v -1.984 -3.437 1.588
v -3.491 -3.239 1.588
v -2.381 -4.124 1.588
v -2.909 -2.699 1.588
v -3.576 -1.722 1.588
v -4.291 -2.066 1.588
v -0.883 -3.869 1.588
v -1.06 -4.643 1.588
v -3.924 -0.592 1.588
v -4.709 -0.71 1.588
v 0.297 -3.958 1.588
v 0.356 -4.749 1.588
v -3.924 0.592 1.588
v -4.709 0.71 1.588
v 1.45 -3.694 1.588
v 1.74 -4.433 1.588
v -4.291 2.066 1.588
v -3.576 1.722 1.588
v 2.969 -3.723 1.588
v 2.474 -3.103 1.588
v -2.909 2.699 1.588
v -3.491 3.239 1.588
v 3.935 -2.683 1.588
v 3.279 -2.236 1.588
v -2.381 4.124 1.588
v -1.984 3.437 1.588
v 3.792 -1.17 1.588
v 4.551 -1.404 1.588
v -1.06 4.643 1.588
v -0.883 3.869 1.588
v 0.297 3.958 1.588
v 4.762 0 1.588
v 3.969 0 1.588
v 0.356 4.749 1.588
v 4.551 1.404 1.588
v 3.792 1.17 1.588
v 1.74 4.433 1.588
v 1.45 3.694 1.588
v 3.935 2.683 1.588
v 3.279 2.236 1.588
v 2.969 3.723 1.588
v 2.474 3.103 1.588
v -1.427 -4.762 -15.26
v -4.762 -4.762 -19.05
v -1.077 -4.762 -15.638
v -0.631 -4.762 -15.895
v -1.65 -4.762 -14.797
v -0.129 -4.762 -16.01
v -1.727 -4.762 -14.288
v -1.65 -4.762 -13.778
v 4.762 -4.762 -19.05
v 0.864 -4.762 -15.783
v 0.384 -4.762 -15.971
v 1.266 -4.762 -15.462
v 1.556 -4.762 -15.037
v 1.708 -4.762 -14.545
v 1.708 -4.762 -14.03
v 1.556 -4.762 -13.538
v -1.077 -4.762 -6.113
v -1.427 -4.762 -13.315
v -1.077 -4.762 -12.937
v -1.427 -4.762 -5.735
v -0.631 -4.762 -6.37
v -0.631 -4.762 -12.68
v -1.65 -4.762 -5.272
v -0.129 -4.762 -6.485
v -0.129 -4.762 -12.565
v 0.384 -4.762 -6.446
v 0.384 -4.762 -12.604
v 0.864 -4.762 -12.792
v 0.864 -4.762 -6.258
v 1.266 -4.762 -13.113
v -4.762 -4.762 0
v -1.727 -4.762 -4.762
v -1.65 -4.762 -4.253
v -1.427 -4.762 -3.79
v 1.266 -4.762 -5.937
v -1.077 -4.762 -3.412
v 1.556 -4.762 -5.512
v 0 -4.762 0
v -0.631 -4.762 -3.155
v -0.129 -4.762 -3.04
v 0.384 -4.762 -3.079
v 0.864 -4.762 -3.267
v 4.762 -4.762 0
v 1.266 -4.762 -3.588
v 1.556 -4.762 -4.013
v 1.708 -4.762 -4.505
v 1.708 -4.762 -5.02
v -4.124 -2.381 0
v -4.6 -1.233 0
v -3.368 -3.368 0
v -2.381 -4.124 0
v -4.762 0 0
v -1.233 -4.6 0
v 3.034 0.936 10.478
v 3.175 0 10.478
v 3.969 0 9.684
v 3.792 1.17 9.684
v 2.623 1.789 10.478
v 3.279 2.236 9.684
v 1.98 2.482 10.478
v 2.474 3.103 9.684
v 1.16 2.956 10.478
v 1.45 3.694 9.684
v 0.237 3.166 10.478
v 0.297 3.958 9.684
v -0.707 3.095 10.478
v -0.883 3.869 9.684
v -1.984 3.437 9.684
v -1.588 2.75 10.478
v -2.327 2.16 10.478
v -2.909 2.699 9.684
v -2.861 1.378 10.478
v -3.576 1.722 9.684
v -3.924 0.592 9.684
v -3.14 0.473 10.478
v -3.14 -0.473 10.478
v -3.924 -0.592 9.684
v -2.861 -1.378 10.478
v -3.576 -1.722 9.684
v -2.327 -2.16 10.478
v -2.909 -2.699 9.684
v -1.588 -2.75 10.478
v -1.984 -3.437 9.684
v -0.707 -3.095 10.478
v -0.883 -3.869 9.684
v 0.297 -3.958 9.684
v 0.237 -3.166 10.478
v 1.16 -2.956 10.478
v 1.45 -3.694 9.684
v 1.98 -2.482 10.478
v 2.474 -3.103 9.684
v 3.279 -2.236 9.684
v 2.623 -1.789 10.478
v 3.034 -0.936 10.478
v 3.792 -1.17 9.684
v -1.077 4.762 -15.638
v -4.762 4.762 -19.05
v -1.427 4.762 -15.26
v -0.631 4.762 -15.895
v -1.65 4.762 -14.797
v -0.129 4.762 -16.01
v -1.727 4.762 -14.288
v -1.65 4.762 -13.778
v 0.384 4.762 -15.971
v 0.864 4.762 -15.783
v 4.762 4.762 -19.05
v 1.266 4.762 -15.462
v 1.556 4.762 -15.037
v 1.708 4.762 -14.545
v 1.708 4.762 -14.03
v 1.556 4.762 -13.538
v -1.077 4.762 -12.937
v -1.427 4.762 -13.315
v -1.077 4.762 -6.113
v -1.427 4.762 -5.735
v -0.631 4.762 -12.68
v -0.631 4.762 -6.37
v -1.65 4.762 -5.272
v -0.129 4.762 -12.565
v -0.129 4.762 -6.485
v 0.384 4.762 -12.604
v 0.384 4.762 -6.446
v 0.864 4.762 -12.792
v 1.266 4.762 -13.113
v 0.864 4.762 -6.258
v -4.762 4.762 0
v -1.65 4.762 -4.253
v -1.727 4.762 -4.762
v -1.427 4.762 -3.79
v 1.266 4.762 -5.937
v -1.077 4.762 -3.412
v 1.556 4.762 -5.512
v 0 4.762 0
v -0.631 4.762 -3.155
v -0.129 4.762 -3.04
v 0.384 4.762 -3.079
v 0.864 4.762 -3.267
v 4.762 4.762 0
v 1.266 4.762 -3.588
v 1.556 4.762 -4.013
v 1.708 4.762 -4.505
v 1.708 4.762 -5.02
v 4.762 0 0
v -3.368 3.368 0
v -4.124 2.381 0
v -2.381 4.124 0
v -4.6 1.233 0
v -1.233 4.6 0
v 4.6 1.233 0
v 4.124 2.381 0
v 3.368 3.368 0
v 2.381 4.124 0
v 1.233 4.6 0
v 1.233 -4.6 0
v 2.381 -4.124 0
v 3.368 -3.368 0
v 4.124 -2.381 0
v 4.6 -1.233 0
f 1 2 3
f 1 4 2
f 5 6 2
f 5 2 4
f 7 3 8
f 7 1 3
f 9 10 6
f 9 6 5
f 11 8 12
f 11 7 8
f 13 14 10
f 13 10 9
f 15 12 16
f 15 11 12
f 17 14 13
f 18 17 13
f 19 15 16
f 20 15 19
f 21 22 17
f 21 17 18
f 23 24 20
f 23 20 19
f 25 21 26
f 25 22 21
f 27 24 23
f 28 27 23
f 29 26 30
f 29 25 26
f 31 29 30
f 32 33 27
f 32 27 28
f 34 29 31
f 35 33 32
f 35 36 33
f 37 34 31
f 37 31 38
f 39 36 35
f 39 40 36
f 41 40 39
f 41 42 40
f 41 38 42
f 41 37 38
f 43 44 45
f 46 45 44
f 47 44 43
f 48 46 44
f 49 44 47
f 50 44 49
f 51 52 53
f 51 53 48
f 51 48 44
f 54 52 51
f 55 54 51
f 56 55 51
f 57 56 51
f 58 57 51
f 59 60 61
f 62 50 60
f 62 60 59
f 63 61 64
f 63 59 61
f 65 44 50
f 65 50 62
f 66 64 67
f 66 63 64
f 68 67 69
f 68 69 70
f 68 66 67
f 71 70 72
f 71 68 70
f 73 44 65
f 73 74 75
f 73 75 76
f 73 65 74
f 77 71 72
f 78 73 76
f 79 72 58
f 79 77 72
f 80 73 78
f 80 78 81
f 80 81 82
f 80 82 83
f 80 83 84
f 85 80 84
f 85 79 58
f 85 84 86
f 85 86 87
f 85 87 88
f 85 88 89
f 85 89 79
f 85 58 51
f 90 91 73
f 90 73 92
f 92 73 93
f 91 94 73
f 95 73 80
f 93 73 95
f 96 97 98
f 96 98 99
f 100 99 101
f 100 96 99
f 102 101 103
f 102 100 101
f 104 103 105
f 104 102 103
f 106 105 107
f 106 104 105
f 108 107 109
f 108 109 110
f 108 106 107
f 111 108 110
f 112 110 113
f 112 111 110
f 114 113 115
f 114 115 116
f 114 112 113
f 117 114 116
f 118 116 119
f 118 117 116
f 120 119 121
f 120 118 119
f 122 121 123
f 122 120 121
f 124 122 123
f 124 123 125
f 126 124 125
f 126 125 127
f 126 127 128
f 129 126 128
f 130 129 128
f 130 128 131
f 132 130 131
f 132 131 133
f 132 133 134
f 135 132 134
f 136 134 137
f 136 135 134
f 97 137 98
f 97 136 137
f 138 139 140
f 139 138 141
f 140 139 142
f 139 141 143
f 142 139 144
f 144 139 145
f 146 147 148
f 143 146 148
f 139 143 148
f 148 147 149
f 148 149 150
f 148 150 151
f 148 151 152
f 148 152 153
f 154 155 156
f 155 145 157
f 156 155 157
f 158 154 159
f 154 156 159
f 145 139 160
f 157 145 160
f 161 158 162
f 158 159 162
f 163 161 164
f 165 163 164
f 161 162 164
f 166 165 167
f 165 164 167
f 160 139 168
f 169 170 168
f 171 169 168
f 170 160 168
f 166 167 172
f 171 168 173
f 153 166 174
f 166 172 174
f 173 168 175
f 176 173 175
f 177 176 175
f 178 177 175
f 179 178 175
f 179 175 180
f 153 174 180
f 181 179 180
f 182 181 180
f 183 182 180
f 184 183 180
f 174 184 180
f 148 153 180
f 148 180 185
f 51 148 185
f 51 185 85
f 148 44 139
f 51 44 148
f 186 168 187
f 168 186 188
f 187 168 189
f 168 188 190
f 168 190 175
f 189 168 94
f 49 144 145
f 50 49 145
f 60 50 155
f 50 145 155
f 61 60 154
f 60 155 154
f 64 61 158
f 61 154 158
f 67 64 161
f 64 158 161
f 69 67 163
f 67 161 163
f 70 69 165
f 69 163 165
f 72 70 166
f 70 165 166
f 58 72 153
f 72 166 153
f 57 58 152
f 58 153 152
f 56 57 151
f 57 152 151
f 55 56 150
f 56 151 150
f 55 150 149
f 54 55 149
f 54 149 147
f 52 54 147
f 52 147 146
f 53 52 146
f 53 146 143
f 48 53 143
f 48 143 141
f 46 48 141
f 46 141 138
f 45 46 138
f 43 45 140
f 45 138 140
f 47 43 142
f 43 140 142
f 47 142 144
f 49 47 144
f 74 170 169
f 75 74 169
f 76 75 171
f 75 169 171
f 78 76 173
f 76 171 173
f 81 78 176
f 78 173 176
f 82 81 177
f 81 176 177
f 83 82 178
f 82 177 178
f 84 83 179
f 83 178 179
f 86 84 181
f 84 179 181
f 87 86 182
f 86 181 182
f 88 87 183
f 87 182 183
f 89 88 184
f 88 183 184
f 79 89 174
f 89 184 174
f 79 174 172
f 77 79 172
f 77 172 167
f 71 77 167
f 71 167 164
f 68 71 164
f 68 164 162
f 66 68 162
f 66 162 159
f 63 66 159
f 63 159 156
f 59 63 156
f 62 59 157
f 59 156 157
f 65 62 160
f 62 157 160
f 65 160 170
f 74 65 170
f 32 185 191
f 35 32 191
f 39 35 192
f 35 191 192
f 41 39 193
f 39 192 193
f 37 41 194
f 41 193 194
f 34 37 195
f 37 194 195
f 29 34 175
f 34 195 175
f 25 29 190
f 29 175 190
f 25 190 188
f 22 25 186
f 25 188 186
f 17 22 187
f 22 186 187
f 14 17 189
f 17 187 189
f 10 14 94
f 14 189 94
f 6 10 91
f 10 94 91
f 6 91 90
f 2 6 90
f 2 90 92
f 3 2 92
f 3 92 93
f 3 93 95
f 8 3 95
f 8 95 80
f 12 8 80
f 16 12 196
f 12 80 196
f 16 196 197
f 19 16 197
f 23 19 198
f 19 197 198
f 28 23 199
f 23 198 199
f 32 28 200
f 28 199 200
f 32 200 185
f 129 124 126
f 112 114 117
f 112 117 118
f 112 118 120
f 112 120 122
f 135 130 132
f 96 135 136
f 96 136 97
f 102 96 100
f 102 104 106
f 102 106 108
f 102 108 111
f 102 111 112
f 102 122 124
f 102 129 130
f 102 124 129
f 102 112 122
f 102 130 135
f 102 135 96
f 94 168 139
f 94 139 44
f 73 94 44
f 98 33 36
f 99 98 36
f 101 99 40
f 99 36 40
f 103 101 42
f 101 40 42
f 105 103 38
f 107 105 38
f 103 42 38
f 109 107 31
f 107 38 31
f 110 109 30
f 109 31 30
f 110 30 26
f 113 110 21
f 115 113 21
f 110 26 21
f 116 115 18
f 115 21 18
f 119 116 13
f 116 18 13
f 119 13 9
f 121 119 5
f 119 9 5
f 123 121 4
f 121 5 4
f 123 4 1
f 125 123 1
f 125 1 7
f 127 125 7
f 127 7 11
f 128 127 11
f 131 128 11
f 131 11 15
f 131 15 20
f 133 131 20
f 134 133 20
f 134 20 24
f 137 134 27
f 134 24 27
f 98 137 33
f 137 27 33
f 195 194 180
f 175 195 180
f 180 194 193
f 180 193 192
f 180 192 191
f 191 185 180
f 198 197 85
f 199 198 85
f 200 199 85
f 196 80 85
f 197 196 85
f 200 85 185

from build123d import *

# Parameters (mm, degrees)
F0_R     = 4.7625
F1_DEPTH = 1.5875
F2_R     = 3.96875
F3_DEPTH = 8.89
F4_W     = 9.525
F4_H     = 9.525
F5_DEPTH = 19.05
F6_SIZE  = 0.79375
F7_R     = 1.7272
F8_DEPTH = 9.525


with BuildPart() as f1:
    # F0 (on Top) → F1 (new body)
    with BuildSketch(Plane.XY):
        Circle(F0_R)
    extrude(amount=F1_DEPTH)

    # F2 (on face) → F3 (join)
    with BuildSketch(Plane.XY.offset(1.5875)):
        Circle(F2_R)
    extrude(amount=F3_DEPTH)

    # F4 (on face) → F5 (join)
    with BuildSketch(Plane(origin=(0, 0, 0), x_dir=(1, 0, 0), z_dir=(0, 0, -1))):
        Rectangle(F4_W, F4_H)
    extrude(amount=F5_DEPTH)

    # F6
    f6_edges = [f1.edges().sort_by_distance(p)[0] for p in [
        (-3.96875, 0, 10.4775),
    ]]
    chamfer(f6_edges, length=F6_SIZE)

    # F7 (on face) → F8 (cut, through all)
    with BuildSketch(Plane(origin=(0, 4.7625, 0), x_dir=(-1, 0, 0), z_dir=(0, 1, 0))):
        with Locations((0, -4.7625)):
            Circle(F7_R)
        with Locations((0, -14.2875)):
            Circle(F7_R)
    extrude(amount=-F8_DEPTH, mode=Mode.SUBTRACT)


solid = f1.part
